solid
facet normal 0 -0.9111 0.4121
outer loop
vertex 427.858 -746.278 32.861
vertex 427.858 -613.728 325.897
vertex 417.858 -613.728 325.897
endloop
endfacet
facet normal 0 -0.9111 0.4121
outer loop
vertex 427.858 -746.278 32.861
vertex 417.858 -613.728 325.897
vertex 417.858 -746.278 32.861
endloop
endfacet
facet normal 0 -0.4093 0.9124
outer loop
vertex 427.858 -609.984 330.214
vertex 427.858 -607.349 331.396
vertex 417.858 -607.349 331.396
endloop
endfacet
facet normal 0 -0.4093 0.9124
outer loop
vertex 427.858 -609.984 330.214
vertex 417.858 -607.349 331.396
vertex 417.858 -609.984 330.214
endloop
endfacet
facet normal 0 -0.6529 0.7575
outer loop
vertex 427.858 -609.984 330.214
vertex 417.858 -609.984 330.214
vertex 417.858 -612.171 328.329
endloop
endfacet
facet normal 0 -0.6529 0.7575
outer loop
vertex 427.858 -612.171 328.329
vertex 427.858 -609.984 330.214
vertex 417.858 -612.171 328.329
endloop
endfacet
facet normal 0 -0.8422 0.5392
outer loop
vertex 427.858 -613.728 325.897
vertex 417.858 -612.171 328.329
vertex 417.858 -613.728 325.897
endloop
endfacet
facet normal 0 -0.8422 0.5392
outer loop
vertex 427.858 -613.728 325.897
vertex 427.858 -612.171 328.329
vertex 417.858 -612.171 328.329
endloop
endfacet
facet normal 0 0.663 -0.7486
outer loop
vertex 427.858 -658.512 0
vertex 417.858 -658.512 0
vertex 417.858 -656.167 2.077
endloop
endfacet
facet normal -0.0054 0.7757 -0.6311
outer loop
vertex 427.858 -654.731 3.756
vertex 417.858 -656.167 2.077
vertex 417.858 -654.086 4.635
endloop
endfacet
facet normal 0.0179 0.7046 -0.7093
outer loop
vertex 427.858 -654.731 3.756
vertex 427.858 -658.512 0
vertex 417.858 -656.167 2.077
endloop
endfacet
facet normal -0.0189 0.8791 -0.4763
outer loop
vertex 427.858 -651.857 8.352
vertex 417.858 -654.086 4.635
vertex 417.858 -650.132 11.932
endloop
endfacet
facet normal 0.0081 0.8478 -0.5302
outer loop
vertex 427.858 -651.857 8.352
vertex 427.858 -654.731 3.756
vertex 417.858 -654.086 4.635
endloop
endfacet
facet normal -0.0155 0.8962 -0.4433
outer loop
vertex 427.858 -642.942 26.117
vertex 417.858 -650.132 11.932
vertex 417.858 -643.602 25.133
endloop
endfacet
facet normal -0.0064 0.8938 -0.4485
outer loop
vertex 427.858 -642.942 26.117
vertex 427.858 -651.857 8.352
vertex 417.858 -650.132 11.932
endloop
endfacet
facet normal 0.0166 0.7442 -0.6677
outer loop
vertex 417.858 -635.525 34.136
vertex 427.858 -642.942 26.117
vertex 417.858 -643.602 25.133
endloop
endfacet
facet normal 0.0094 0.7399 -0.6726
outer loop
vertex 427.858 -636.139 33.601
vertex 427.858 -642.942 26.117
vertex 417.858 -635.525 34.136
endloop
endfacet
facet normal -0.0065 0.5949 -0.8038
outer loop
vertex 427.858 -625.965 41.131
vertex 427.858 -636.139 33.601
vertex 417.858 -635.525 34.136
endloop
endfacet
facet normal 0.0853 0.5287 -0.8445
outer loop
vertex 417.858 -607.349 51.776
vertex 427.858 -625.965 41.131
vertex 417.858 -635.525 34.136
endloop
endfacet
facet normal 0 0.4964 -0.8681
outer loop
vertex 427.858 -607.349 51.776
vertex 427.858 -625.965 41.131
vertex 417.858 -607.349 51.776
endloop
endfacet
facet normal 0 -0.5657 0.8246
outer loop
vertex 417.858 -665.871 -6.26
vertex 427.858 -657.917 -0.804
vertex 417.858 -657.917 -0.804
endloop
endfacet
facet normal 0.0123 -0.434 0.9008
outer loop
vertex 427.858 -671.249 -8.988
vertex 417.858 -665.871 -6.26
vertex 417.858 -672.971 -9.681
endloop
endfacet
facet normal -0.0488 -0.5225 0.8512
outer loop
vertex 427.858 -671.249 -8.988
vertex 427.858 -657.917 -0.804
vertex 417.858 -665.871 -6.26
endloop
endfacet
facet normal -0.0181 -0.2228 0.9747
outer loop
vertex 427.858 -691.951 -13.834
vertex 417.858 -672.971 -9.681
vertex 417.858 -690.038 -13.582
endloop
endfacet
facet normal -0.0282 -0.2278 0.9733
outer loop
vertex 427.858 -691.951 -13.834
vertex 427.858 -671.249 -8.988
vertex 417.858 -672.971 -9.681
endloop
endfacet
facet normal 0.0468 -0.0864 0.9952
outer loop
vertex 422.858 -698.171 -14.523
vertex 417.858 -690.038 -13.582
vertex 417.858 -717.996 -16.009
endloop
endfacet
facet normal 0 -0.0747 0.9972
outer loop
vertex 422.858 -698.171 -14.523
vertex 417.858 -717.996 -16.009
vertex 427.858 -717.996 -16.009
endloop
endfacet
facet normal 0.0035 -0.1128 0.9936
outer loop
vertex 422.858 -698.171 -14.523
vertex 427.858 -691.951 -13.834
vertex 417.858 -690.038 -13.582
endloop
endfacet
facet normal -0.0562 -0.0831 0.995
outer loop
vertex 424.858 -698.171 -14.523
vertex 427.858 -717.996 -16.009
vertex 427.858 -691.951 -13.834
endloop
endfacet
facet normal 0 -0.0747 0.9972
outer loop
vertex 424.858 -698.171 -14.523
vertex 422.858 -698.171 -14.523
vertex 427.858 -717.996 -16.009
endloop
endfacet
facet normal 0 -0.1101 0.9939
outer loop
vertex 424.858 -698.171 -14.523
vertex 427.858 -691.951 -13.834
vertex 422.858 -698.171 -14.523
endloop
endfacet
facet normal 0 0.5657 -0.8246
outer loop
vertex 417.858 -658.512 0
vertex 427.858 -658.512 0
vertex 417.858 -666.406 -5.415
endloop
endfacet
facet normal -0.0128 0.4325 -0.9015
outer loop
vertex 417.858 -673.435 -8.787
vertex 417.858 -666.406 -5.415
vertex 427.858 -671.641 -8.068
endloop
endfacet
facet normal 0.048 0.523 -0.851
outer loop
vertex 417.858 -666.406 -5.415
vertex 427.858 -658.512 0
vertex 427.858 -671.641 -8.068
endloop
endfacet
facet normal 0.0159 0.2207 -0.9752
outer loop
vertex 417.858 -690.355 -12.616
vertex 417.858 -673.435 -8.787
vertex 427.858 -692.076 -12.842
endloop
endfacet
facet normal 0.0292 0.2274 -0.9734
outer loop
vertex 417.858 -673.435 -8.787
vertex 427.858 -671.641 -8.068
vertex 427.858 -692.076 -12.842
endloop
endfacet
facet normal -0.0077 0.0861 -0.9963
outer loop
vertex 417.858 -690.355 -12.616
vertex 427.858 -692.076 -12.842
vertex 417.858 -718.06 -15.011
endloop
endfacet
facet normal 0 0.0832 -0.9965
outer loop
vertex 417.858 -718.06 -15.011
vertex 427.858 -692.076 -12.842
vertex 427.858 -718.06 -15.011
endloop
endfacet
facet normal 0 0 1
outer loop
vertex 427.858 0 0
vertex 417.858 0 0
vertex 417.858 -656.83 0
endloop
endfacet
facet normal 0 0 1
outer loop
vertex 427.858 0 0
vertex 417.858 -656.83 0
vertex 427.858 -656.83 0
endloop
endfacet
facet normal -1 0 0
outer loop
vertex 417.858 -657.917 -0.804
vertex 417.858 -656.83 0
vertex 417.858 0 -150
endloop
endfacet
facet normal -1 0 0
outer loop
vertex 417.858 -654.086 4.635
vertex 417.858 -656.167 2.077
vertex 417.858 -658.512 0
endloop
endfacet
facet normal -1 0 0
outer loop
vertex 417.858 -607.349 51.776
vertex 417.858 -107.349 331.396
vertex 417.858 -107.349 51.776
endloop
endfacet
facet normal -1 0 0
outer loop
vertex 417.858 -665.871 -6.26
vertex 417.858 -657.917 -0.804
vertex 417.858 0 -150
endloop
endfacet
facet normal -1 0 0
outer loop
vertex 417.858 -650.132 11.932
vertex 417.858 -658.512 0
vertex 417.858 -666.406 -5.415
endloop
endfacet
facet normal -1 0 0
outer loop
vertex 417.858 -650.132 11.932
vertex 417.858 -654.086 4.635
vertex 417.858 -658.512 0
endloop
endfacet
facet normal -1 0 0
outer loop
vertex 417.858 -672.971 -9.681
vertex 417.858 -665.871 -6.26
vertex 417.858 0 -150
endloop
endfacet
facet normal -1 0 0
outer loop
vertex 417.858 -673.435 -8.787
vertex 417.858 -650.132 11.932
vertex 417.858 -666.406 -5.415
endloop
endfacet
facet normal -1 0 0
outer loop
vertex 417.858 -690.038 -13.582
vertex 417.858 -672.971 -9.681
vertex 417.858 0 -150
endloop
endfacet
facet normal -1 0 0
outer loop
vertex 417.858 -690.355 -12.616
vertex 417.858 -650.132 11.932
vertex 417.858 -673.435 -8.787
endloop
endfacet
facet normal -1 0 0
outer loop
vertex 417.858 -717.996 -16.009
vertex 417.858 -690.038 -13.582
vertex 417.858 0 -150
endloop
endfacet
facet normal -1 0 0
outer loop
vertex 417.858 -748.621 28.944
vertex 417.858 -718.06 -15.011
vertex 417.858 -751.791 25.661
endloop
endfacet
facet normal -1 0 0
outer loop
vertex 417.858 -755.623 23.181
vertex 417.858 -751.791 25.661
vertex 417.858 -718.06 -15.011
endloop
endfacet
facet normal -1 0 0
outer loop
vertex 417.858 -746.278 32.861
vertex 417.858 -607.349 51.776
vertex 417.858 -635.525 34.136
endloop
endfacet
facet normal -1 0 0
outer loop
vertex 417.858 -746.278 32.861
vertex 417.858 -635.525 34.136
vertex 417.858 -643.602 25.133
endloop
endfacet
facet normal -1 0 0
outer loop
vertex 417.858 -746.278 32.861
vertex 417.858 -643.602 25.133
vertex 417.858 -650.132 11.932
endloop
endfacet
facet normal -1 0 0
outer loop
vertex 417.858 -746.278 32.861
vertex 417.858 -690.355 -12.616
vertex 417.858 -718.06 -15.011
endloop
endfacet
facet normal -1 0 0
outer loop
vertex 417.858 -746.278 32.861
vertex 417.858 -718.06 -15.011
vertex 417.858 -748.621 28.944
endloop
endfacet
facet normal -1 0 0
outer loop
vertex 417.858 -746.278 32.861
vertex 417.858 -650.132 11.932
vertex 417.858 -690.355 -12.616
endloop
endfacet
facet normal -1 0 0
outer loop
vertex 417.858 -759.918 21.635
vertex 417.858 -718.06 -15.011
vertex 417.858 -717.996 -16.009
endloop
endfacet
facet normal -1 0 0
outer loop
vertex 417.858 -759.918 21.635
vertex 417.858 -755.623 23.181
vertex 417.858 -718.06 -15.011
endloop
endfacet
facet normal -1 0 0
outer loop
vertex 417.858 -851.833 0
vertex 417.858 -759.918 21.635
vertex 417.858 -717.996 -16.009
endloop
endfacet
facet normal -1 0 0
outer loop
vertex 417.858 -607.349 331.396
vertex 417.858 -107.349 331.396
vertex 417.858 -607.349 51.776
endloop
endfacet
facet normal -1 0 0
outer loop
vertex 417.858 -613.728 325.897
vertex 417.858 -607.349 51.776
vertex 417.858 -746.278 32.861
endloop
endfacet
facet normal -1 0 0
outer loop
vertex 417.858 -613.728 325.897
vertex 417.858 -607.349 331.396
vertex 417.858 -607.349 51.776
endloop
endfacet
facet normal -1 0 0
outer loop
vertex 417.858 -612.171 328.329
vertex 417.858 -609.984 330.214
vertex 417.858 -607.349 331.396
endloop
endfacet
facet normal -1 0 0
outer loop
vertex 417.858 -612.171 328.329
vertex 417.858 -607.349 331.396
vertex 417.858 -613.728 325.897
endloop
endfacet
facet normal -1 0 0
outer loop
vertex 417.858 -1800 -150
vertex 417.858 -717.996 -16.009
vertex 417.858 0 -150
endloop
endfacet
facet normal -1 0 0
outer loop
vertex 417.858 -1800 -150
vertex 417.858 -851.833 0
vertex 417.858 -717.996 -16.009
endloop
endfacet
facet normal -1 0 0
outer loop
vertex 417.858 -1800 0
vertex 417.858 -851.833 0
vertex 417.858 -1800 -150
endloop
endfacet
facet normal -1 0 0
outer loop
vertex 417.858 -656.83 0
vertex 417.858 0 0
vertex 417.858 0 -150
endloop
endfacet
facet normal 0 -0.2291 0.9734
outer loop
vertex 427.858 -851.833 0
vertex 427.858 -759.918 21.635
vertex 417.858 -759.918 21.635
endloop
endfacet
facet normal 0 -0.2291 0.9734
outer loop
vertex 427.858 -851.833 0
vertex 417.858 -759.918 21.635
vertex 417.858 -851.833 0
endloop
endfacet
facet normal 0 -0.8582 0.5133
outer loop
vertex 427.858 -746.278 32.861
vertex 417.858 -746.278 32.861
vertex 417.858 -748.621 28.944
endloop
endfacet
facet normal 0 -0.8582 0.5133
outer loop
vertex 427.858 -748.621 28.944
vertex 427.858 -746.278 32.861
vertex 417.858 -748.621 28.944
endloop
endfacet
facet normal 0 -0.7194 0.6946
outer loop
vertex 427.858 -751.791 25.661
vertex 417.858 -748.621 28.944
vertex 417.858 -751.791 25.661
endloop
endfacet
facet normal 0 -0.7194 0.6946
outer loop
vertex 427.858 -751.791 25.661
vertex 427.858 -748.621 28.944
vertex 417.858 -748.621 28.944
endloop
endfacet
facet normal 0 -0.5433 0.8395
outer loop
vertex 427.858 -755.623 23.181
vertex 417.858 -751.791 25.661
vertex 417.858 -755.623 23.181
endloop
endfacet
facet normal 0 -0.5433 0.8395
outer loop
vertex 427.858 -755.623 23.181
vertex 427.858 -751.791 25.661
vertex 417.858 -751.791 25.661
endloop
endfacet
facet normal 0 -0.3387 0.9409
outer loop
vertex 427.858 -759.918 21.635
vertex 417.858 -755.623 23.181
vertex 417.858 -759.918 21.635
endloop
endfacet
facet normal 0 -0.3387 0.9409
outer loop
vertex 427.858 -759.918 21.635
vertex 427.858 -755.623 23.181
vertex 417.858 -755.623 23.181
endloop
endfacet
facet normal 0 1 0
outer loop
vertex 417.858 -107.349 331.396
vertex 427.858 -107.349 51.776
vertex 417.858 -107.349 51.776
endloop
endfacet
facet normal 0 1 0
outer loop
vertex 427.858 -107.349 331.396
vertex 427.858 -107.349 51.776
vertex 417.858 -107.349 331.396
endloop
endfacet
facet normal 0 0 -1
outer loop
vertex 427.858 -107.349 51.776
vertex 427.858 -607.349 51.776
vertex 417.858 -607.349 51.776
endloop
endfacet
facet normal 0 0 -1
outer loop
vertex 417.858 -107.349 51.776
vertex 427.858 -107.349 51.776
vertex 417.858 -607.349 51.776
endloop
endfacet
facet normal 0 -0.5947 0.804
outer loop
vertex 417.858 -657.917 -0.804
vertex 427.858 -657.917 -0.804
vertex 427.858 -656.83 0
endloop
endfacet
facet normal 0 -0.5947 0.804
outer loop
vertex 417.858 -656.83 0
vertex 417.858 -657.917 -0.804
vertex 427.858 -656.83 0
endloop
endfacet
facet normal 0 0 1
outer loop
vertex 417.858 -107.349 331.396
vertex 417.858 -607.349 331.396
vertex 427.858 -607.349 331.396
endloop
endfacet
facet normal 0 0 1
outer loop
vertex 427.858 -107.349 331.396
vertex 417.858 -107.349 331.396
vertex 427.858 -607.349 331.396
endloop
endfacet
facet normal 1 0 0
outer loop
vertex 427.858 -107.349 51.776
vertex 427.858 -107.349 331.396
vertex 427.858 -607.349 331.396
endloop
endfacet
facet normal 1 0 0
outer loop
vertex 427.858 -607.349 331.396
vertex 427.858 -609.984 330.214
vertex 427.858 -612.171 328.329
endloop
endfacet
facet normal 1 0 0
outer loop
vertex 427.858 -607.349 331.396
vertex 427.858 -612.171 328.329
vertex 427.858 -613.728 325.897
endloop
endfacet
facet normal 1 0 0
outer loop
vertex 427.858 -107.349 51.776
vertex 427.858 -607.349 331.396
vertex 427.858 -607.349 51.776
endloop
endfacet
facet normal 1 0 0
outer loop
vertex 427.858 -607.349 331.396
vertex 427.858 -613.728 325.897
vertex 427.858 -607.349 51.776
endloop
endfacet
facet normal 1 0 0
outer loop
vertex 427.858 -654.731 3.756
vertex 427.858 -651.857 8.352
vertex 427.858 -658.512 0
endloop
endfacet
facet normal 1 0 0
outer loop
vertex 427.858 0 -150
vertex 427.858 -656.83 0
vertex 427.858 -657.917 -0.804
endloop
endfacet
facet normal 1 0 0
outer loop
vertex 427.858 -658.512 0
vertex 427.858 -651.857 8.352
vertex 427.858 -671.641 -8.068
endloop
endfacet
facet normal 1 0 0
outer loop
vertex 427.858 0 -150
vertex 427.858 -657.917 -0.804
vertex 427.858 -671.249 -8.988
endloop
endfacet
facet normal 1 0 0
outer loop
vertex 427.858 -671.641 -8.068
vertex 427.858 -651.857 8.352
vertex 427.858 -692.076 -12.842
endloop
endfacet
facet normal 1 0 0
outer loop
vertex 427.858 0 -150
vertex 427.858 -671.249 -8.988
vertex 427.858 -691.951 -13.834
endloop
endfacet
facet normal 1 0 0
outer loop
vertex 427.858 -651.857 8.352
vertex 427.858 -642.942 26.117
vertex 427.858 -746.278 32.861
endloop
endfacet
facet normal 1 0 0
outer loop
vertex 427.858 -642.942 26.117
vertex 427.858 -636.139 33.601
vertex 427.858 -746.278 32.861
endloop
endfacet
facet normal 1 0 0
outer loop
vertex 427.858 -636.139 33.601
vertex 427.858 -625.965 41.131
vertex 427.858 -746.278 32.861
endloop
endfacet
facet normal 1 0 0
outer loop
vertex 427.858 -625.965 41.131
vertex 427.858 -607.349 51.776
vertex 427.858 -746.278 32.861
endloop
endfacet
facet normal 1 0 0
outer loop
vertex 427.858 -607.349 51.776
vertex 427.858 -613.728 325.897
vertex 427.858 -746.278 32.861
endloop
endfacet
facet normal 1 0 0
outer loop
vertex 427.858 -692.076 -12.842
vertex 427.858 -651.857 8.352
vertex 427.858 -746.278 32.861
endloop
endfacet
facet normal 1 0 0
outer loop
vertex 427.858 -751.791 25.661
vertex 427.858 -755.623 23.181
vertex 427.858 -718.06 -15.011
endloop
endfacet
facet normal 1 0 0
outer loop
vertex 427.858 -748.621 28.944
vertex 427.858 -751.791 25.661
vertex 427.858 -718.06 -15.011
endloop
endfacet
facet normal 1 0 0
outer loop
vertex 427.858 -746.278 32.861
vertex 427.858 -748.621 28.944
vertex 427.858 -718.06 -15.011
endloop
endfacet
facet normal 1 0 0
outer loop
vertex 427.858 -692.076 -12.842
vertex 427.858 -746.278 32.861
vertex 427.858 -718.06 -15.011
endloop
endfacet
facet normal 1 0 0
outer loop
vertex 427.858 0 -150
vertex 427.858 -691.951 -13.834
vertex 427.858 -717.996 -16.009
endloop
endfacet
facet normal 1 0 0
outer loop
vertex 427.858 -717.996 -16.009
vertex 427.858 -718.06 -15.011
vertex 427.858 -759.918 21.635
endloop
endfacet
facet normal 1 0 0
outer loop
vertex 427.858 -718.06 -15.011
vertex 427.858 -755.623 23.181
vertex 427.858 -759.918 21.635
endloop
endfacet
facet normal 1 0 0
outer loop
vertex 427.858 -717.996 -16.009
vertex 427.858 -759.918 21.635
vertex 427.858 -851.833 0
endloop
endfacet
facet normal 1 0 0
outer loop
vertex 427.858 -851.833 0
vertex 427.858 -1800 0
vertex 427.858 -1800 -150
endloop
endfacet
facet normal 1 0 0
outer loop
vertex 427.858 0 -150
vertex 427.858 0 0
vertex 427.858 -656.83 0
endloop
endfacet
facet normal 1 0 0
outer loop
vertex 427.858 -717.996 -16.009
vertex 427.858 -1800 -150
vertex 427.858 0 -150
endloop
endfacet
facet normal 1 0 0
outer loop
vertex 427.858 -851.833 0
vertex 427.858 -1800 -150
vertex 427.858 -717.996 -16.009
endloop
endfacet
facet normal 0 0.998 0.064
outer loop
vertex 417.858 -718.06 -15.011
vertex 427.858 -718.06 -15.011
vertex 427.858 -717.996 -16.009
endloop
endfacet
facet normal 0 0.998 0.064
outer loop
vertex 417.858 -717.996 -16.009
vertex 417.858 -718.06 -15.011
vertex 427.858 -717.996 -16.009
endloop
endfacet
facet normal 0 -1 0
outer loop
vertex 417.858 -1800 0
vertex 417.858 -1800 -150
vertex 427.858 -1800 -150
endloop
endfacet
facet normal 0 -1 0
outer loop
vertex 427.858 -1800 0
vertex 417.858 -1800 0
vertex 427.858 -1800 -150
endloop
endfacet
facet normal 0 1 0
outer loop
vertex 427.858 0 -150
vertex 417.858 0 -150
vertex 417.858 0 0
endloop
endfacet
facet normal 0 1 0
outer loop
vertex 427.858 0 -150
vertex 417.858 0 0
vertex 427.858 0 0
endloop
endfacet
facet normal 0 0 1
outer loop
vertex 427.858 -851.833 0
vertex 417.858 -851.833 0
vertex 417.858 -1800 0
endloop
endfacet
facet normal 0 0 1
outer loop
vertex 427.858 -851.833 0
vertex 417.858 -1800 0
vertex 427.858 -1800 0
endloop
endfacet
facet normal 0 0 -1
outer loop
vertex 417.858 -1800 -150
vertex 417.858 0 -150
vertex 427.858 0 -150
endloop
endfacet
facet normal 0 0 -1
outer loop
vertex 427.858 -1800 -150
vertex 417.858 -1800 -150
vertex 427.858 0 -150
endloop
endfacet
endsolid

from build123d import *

# Parameters (mm, degrees)
F0_W      = 1000
F0_H      = 150
F1_DEPTH  = 1800
F5_DEPTH  = 250
F7_DEPTH  = 250
F8_W      = 1814.4553899765
F8_H      = 676.3893961906
F9_DEPTH  = 500
F10_DEPTH = 500
F11_W     = 1876.0774359107
F11_H     = 584.96324718
F12_DEPTH = 490


# Not quite as in the source:
# - the dataset's text gives a spline's control points without its knots; the knots are read off the source's solid


with BuildPart() as f1:
    # F0 (on Front) → F1 (new body)
    with BuildSketch(Plane.XZ):
        with Locations((427.8578534722, -75)):
            Rectangle(F0_W, F0_H)
    extrude(amount=F1_DEPTH)

    # F4 (on plane+point) → F5 (join, symmetric)
    with BuildSketch(Plane.YZ.offset(427.8578534722)):
        with BuildLine():
            add(Edge.make_bspline(
                [(-658.5119275224, 0), (-663.1096709351, -3.3994040102), (-674.8923410513, -12.2269214906), (-701.8084297627, -13.9660228128), (-718.060195446, -15.0110442191)],
                knots=[0, 0, 0, 0, 0.3960668718, 1, 1, 1, 1], degree=3))
            add(Edge.make_bspline(
                [(-658.5119275224, 0), (-650.3595915647, 6.0275402647), (-648.0235359943, 31.4958112046), (-617.163744576, 46.1983191108), (-607.3494242193, 51.7760817812)],
                knots=[0, 0, 0, 0, 0.4646733695, 1, 1, 1, 1], degree=3))
            Line((-607.3494242193, 51.7760817812), (-607.3494242193, 331.3955929823))
            ThreePointArc((-607.3494242193, 331.3955929823), (-611.1459562468, 329.3507401392), (-613.7284624486, 325.8973736217))
            Line((-613.7284624486, 325.8973736217), (-746.2776173449, 32.8608466306))
            ThreePointArc((-746.2776173449, 32.8608466306), (-751.7911260188, 25.6605897485), (-759.9176837495, 21.6354765186))
            Line((-759.9176837495, 21.6354765186), (-851.8334031105, 0))
            Line((-851.8334031105, 0), (-724.4437932968, 0))
            Line((-724.4437932968, 0), (-718.060195446, -15.0110442191))
        make_face()
    extrude(amount=F5_DEPTH, both=True)

    # F6 (on plane+point) → F7 (cut, symmetric)
    with BuildSketch(Plane.YZ.offset(427.8578534722)):
        with BuildLine():
            add(Edge.make_bspline(
                [(-657.9174152342, -0.8040865247), (-659.3673865445, -1.8761424975), (-662.3030933204, -4.0564869069), (-666.4204873665, -6.6707717939), (-670.1931092733, -8.5651184529), (-673.3105086069, -9.8565410415), (-676.7740170416, -10.9816784698), (-681.8145421149, -12.2587633506), (-688.8193216778, -13.5004768766), (-698.0763714753, -14.5692911085), (-707.8993120937, -15.3593398489), (-714.632248917, -15.792685566), (-717.9960259489, -16.0089832331)],
                knots=[0, 0, 0, 0, 0.125, 0.25, 0.3125, 0.375, 0.4375, 0.5, 0.625, 0.75, 0.875, 1, 1, 1, 1], degree=3))
            Line((-657.9174152342, -0.8040865247), (-656.8298765035, 0))
            Line((-656.8298765035, 0), (-658.5119275224, 0))
            add(Edge.make_bspline(
                [(-658.5119275224, 0), (-663.1096709351, -3.3994040102), (-674.8923410513, -12.2269214906), (-701.8084297627, -13.9660228128), (-718.060195446, -15.0110442191)],
                knots=[0, 0, 0, 0, 0.3960668718, 1, 1, 1, 1], degree=3))
            Line((-718.060195446, -15.0110442191), (-717.9960259489, -16.0089832331))
        make_face()
    extrude(amount=F7_DEPTH, both=True, mode=Mode.SUBTRACT)

    # F8 (on plane+point) → F9 (cut, through all)
    with BuildSketch(Plane.YZ.offset(427.8578534722)):
        with Locations((-907.2276949883, 182.6078593731)):
            Rectangle(F8_W, F8_H)
    extrude(amount=F9_DEPTH, mode=Mode.SUBTRACT)

    # F10 (add): a face of the model
    f10_faces = [f1.faces().sort_by_distance(p)[0] for p in [
        (302.8578534722, -607.3494242193, 191.5858373818),
    ]]
    extrude(f10_faces, amount=F10_DEPTH)

    # F11 (on face) → F12 (cut)
    with BuildSketch(Plane(origin=(-72.1421465278, 0, 0), x_dir=(0, -1, 0), z_dir=(-1, 0, 0))):
        with Locations((910.4874022305, 71.823425591)):
            Rectangle(F11_W, F11_H)
    extrude(amount=-F12_DEPTH, mode=Mode.SUBTRACT)


solid = f1.part
